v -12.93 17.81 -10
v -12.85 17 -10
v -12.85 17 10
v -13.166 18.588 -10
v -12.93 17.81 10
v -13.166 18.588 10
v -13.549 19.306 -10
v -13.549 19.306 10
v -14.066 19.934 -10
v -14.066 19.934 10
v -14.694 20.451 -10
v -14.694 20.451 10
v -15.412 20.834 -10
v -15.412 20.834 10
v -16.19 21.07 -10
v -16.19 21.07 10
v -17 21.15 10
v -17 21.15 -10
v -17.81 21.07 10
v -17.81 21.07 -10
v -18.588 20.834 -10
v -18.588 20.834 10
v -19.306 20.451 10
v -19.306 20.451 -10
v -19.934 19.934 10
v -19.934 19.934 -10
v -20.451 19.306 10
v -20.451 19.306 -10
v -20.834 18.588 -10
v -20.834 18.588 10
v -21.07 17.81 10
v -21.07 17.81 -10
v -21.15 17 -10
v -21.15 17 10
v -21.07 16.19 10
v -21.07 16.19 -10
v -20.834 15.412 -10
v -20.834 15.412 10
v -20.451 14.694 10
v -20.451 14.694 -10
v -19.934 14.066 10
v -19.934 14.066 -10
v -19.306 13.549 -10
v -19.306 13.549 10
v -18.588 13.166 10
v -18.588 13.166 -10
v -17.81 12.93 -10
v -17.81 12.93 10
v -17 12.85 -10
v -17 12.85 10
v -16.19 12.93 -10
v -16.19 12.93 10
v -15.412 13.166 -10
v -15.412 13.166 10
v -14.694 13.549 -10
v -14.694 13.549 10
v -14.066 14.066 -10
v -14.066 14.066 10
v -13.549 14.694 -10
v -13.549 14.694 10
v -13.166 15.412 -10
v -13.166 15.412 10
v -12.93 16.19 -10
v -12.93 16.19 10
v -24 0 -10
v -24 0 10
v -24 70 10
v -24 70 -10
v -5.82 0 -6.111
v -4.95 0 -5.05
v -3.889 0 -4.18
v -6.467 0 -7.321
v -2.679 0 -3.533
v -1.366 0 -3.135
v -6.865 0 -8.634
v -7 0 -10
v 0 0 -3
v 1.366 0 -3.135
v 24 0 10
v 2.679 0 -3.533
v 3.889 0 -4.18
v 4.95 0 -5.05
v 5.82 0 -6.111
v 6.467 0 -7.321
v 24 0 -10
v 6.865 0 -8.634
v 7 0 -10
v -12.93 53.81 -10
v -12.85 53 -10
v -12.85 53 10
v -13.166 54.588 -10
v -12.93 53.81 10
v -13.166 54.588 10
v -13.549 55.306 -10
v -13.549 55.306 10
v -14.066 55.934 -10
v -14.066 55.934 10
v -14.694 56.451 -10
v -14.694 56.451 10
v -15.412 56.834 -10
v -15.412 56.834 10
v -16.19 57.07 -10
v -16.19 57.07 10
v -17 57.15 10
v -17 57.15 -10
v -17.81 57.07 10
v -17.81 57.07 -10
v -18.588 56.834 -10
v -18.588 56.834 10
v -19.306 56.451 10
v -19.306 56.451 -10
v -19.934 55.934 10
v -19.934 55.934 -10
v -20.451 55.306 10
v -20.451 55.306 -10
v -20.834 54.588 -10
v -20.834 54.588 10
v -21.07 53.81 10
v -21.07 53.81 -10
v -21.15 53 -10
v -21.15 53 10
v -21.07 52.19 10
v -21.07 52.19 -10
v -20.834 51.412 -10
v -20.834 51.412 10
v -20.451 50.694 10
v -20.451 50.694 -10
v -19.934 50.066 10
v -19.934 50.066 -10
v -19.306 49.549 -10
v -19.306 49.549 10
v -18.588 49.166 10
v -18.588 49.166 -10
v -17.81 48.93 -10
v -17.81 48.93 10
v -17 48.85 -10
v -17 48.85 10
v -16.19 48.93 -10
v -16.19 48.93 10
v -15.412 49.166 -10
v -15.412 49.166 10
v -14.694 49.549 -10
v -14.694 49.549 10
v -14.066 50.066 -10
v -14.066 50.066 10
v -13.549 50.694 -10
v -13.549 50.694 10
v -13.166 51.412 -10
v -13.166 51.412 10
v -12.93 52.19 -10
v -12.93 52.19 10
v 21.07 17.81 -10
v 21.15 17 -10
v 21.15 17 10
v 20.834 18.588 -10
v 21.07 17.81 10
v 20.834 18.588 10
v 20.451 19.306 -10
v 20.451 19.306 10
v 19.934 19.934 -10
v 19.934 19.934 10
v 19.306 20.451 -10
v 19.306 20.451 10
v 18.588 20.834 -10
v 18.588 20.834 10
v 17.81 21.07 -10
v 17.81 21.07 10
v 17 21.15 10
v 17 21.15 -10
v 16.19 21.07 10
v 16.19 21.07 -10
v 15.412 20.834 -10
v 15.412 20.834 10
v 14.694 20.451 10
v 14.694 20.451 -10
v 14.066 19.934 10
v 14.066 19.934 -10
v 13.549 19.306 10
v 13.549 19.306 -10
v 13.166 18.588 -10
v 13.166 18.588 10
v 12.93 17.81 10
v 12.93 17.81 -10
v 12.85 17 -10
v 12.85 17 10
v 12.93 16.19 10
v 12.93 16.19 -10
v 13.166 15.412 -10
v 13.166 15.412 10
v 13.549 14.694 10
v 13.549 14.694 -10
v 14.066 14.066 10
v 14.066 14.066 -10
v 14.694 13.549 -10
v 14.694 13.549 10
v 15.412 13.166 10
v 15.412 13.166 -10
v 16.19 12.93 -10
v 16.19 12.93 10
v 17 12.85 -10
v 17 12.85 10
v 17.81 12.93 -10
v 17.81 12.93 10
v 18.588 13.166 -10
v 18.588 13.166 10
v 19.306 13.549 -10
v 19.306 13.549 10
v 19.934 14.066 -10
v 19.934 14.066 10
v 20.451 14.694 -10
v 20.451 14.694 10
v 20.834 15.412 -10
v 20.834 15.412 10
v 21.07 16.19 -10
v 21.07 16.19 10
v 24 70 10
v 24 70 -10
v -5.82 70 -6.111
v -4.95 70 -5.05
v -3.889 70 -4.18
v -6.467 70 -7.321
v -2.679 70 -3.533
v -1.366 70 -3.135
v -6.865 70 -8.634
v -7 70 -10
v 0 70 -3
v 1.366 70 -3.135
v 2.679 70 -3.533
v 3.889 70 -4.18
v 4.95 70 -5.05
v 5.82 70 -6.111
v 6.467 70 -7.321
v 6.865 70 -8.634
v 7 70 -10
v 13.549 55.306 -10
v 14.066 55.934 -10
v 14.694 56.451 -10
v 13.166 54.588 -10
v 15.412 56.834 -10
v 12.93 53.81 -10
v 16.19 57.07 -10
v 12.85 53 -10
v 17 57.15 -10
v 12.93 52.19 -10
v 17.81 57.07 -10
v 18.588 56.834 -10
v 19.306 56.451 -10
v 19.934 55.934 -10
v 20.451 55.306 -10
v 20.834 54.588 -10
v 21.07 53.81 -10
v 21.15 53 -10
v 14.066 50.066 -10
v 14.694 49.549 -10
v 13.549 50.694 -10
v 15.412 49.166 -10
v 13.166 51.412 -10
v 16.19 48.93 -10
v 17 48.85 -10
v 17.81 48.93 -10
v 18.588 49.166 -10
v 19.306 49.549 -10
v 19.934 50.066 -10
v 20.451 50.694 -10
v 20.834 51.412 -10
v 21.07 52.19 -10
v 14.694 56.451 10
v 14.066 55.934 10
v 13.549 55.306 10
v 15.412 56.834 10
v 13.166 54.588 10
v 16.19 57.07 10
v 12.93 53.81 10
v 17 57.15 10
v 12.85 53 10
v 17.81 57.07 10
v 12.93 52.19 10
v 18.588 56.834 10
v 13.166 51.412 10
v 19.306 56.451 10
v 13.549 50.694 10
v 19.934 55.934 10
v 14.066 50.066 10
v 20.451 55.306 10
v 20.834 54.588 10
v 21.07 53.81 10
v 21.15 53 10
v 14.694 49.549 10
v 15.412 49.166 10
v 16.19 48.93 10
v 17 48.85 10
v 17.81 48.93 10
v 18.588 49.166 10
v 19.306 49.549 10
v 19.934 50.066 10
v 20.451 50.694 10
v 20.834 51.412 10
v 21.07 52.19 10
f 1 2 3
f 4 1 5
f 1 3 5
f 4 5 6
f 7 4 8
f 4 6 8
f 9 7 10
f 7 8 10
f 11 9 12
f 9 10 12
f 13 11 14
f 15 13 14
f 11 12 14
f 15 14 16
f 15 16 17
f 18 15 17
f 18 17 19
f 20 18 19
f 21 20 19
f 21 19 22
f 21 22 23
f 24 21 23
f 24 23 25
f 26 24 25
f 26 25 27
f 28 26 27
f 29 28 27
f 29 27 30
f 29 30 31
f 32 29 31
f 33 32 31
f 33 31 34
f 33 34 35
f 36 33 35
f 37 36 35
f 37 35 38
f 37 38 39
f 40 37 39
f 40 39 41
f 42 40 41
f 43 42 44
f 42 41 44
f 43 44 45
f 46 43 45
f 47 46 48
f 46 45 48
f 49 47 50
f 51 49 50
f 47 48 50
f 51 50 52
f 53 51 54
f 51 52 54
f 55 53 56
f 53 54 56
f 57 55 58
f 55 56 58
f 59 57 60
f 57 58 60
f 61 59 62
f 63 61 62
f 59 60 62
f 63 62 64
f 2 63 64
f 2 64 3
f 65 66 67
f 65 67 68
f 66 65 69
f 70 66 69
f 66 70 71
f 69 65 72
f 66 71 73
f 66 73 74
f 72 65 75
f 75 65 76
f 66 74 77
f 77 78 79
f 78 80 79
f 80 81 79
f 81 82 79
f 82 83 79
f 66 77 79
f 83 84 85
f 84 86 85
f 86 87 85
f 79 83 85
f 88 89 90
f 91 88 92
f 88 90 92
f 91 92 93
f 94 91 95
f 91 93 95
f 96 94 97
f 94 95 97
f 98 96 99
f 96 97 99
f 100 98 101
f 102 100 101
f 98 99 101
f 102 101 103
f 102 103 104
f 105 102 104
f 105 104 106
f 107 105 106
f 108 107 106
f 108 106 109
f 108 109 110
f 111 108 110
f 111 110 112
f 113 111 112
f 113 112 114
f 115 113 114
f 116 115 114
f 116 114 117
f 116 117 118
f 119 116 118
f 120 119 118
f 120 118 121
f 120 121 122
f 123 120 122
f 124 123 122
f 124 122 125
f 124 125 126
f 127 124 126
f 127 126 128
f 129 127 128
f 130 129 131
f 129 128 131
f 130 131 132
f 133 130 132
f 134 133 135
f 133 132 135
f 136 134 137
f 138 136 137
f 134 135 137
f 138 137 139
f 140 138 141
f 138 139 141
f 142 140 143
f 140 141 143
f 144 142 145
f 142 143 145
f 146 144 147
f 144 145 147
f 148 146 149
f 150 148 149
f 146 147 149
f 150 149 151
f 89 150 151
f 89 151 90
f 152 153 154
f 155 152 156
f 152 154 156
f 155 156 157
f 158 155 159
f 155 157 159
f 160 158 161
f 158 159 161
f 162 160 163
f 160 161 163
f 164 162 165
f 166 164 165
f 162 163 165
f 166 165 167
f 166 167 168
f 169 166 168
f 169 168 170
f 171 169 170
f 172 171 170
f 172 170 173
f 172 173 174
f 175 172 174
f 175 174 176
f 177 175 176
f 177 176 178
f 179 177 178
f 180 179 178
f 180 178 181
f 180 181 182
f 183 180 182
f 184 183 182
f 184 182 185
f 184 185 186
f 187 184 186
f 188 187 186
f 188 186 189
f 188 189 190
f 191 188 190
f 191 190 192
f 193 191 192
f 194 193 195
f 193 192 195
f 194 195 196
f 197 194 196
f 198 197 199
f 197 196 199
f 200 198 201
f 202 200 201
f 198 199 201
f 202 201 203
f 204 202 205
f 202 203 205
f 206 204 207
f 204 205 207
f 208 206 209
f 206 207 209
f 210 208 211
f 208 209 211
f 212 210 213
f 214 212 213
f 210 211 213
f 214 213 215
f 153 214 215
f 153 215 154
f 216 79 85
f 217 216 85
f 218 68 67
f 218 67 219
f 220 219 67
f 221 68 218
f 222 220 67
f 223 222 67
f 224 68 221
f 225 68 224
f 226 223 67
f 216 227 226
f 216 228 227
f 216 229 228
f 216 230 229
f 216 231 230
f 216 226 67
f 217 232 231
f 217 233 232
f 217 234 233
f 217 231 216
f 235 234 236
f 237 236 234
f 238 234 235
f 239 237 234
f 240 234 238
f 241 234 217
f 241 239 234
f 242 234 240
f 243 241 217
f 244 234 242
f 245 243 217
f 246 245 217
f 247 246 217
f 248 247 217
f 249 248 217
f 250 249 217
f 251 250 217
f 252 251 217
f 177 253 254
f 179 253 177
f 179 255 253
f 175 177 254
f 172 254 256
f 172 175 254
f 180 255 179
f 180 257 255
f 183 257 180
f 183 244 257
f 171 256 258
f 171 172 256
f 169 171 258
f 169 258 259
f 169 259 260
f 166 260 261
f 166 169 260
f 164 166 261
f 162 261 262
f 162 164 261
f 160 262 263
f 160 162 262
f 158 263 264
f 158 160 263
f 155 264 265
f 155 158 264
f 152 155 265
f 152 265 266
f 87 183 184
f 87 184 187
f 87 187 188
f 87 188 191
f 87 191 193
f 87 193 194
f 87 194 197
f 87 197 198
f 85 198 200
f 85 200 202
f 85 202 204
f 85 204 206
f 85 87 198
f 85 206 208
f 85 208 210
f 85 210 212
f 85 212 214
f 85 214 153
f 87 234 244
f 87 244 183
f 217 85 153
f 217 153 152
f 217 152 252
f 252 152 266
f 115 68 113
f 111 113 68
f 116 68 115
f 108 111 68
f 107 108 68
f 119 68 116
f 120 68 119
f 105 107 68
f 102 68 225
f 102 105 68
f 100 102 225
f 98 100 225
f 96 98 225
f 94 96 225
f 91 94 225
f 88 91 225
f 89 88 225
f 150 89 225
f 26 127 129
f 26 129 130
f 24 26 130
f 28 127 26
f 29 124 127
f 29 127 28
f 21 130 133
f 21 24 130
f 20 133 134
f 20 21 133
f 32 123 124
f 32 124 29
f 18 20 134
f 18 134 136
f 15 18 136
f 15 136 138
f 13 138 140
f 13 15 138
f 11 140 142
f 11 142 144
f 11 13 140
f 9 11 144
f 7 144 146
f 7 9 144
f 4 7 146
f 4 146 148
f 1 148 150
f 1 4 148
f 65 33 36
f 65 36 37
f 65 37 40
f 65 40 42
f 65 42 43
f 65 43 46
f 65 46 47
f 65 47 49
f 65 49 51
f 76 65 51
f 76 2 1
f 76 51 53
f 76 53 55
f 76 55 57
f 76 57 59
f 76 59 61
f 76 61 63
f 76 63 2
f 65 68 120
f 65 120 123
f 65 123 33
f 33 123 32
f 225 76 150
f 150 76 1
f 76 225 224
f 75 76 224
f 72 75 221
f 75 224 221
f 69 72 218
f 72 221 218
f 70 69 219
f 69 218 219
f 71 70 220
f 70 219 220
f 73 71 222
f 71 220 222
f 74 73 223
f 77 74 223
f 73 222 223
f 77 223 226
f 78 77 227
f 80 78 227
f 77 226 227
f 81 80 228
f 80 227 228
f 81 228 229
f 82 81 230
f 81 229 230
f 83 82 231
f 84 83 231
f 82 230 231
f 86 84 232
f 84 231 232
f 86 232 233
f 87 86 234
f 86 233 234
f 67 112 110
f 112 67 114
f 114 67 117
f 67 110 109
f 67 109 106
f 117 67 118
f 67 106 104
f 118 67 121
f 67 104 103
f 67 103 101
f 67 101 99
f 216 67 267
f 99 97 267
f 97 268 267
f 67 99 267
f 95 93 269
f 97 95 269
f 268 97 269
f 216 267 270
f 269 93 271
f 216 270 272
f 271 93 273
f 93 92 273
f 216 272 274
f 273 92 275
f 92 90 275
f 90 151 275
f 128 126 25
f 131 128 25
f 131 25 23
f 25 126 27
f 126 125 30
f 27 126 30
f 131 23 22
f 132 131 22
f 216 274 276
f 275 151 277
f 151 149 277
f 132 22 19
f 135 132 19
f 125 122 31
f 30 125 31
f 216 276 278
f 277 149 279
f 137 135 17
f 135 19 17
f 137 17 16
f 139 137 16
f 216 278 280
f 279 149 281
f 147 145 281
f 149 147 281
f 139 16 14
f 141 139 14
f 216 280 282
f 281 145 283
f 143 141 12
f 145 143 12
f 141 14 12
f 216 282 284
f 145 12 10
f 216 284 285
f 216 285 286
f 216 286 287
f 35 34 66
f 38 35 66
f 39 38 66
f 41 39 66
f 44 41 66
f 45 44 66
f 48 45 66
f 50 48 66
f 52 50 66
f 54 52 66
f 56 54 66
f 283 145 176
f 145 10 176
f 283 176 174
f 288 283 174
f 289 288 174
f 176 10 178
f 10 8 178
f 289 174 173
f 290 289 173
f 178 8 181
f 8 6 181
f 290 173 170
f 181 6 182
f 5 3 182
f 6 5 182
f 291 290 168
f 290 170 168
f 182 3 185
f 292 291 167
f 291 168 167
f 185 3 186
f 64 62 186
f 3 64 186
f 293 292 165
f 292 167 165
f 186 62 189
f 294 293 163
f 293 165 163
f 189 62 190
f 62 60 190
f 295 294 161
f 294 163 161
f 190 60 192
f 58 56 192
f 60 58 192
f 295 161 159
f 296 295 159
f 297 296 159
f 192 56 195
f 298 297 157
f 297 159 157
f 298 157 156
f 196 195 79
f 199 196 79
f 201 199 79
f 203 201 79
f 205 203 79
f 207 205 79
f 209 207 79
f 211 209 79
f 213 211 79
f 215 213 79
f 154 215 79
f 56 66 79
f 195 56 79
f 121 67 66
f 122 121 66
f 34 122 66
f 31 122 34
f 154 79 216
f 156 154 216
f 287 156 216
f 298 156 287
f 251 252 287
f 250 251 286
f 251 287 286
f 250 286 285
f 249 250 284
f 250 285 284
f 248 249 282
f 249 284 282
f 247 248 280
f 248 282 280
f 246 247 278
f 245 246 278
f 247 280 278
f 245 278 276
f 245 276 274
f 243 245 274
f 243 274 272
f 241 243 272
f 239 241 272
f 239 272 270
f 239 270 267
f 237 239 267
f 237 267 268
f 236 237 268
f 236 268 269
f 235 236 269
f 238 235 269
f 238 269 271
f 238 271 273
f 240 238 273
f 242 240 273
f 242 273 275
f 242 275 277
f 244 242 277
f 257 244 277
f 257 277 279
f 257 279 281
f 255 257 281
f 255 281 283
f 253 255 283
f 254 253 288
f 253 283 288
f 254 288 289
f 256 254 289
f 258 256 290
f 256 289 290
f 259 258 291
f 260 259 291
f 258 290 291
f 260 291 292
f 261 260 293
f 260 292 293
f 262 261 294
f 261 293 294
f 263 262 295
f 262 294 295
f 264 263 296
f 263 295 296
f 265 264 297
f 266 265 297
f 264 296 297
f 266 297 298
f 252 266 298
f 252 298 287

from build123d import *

# Parameters (mm, degrees)
SKETCH1_W               = 48
SKETCH1_H               = 20
BOSS_EXTRUDE1_DEPTH     = 70
SKETCH3_R               = 4.15
CUT_EXTRUDE2_DEPTH      = 21
CUT_EXTRUDE3_DEPTH      = 1
CUT_EXTRUDE3_DEPTH_BACK = 71


with BuildPart() as part:
    # Sketch1 → Boss-Extrude1 (new body)
    with BuildSketch(Plane(origin=(0, 0, 0), x_dir=(1, 0, 0), z_dir=(0, 1, 0))):
        Rectangle(SKETCH1_W, SKETCH1_H)
    extrude(amount=BOSS_EXTRUDE1_DEPTH)

    # Sketch3 → Cut-Extrude2 (cut, through all)
    with BuildSketch(Plane.XY.offset(10)):
        with Locations((17, 53)):
            Circle(SKETCH3_R)
        with Locations((-17, 53)):
            Circle(SKETCH3_R)
        with Locations((-17, 17)):
            Circle(SKETCH3_R)
        with Locations((17, 17)):
            Circle(SKETCH3_R)
    extrude(amount=-CUT_EXTRUDE2_DEPTH, mode=Mode.SUBTRACT)

    # Sketch4 → Cut-Extrude3 (cut, two sides)
    with BuildSketch(Plane(origin=(0, 70, 0), x_dir=(1, 0, 0), z_dir=(0, 1, 0))) as cut_extrude3_sk:
        with BuildLine():
            Line((-7, 93.783466983), (-7, 10))
            ThreePointArc((-7, 10), (0, 3), (7, 10))
            Line((7, 10), (7, 93.783466983))
            Line((7, 93.783466983), (7, 261.350400948))
            Line((7, 261.350400948), (-7, 261.350400948))
            Line((-7, 261.350400948), (-7, 93.783466983))
        make_face()
    extrude(amount=CUT_EXTRUDE3_DEPTH, mode=Mode.SUBTRACT)
    extrude(cut_extrude3_sk.sketch, amount=-CUT_EXTRUDE3_DEPTH_BACK, mode=Mode.SUBTRACT)


solid = part.part
